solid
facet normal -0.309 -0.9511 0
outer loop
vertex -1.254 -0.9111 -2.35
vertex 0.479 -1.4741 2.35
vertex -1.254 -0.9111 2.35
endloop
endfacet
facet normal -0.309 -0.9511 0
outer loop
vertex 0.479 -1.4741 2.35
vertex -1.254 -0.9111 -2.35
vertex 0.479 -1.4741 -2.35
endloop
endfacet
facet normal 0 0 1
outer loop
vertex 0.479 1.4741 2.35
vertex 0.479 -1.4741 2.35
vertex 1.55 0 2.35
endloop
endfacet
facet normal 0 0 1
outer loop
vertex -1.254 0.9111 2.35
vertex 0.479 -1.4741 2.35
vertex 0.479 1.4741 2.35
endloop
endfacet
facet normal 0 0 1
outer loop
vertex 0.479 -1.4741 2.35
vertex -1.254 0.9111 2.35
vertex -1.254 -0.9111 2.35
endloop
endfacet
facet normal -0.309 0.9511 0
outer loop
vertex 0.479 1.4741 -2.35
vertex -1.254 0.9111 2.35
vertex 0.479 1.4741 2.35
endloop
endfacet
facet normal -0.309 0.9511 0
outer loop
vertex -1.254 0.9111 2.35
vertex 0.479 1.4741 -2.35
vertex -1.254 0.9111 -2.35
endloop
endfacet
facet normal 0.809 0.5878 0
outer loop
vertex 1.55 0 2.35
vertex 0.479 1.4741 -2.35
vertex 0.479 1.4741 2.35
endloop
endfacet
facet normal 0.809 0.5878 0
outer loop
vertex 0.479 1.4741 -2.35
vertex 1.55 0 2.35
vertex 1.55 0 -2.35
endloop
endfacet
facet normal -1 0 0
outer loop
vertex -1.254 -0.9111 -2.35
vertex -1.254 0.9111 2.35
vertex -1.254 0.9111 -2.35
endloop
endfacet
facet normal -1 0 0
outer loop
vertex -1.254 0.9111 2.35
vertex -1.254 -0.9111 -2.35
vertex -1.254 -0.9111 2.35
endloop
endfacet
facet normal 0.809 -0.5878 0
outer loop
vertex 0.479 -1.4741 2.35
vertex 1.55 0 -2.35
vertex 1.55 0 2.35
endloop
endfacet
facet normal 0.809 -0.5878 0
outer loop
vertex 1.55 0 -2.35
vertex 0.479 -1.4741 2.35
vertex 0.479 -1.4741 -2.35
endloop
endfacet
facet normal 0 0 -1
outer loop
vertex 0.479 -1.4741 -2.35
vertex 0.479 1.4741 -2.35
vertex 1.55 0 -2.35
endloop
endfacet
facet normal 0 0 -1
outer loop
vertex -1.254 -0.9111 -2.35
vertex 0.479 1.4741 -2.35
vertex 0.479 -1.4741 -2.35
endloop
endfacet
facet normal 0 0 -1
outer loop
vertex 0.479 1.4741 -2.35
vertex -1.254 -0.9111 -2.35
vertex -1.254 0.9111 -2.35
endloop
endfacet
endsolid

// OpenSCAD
// Parameters
outer_diameter_mm = 3; //[1.5:6:0.05]
length_mm = 4.6; //[2.3:9.2:0.05]
screw_nominal_diameter_mm = 3; //[1.5:6:0.1]
internal_thread = 1; //[0:1:1]
thread_pitch_mm = 0.5; //[0.25:1:0.05]
pilot_bore_diameter_mm = 2.5; //[1.25:5:0.05]
clearance_bore_diameter_mm = 3.1; //[2.5:4:0.05]
chamfer_length_mm = 0.3; //[0:1:0.05]
chamfer_angle_deg = 45; //[15:75:1]
knurling = 0; //[0:1:1]
knurl_depth_mm = 0.15; //[0.05:0.3:0.01]
knurl_pitch_mm = 0.6; //[0.3:1.2:0.05]
tolerance_outer_diameter_mm = 0.1; //[0:0.3:0.01]
tolerance_length_mm = 0.1; //[0:0.3:0.01]
eps_mm = 0.5; //[0.2:2:0.1]

// Threaded Insert - complete geometry
module threaded_insert() {
  // Calculate chamfer radius reduction
  chamfer_radius_reduction = chamfer_length_mm * tan(chamfer_angle_deg * PI / 180);

  // Main body with chamfers
  union() {
    // Main cylindrical body
    cylinder(
      h = length_mm + tolerance_length_mm,
      r = (outer_diameter_mm + tolerance_outer_diameter_mm) / 2,
      center = true
    );

    // Top chamfer
    translate([0, 0, (length_mm + tolerance_length_mm) / 2 - (chamfer_length_mm + eps_mm) / 2])
      cylinder(
        h = chamfer_length_mm + eps_mm,
        r1 = (outer_diameter_mm + tolerance_outer_diameter_mm) / 2,
        r2 = max(0, (outer_diameter_mm + tolerance_outer_diameter_mm) / 2 - chamfer_radius_reduction),
        center = true
      );

    // Bottom chamfer
    translate([0, 0, -(length_mm + tolerance_length_mm) / 2 + (chamfer_length_mm + eps_mm) / 2])
      rotate([180, 0, 0])
      cylinder(
        h = chamfer_length_mm + eps_mm,
        r1 = (outer_diameter_mm + tolerance_outer_diameter_mm) / 2,
        r2 = max(0, (outer_diameter_mm + tolerance_outer_diameter_mm) / 2 - chamfer_radius_reduction),
        center = true
      );
  }

  // Internal bore (threaded or clearance)
  difference() {
    // Main body with chamfers
    union() {
      // Main cylindrical body
      cylinder(
        h = length_mm + tolerance_length_mm,
        r = (outer_diameter_mm + tolerance_outer_diameter_mm) / 2,
        center = true
      );

      // Top chamfer
      translate([0, 0, (length_mm + tolerance_length_mm) / 2 - (chamfer_length_mm + eps_mm) / 2])
        cylinder(
          h = chamfer_length_mm + eps_mm,
          r1 = (outer_diameter_mm + tolerance_outer_diameter_mm) / 2,
          r2 = max(0, (outer_diameter_mm + tolerance_outer_diameter_mm) / 2 - chamfer_radius_reduction),
          center = true
        );

      // Bottom chamfer
      translate([0, 0, -(length_mm + tolerance_length_mm) / 2 + (chamfer_length_mm + eps_mm) / 2])
        rotate([180, 0, 0])
        cylinder(
          h = chamfer_length_mm + eps_mm,
          r1 = (outer_diameter_mm + tolerance_outer_diameter_mm) / 2,
          r2 = max(0, (outer_diameter_mm + tolerance_outer_diameter_mm) / 2 - chamfer_radius_reduction),
          center = true
        );
    }

    // Internal bore
    cylinder(
      h = (length_mm + tolerance_length_mm) + 2 * eps_mm,
      r = ((internal_thread * pilot_bore_diameter_mm) + ((1 - internal_thread) * clearance_bore_diameter_mm)) / 2,
      center = true
    );
  }
}

// Assembly
module assembly() {
  color("Brass") threaded_insert();
}

assembly();
